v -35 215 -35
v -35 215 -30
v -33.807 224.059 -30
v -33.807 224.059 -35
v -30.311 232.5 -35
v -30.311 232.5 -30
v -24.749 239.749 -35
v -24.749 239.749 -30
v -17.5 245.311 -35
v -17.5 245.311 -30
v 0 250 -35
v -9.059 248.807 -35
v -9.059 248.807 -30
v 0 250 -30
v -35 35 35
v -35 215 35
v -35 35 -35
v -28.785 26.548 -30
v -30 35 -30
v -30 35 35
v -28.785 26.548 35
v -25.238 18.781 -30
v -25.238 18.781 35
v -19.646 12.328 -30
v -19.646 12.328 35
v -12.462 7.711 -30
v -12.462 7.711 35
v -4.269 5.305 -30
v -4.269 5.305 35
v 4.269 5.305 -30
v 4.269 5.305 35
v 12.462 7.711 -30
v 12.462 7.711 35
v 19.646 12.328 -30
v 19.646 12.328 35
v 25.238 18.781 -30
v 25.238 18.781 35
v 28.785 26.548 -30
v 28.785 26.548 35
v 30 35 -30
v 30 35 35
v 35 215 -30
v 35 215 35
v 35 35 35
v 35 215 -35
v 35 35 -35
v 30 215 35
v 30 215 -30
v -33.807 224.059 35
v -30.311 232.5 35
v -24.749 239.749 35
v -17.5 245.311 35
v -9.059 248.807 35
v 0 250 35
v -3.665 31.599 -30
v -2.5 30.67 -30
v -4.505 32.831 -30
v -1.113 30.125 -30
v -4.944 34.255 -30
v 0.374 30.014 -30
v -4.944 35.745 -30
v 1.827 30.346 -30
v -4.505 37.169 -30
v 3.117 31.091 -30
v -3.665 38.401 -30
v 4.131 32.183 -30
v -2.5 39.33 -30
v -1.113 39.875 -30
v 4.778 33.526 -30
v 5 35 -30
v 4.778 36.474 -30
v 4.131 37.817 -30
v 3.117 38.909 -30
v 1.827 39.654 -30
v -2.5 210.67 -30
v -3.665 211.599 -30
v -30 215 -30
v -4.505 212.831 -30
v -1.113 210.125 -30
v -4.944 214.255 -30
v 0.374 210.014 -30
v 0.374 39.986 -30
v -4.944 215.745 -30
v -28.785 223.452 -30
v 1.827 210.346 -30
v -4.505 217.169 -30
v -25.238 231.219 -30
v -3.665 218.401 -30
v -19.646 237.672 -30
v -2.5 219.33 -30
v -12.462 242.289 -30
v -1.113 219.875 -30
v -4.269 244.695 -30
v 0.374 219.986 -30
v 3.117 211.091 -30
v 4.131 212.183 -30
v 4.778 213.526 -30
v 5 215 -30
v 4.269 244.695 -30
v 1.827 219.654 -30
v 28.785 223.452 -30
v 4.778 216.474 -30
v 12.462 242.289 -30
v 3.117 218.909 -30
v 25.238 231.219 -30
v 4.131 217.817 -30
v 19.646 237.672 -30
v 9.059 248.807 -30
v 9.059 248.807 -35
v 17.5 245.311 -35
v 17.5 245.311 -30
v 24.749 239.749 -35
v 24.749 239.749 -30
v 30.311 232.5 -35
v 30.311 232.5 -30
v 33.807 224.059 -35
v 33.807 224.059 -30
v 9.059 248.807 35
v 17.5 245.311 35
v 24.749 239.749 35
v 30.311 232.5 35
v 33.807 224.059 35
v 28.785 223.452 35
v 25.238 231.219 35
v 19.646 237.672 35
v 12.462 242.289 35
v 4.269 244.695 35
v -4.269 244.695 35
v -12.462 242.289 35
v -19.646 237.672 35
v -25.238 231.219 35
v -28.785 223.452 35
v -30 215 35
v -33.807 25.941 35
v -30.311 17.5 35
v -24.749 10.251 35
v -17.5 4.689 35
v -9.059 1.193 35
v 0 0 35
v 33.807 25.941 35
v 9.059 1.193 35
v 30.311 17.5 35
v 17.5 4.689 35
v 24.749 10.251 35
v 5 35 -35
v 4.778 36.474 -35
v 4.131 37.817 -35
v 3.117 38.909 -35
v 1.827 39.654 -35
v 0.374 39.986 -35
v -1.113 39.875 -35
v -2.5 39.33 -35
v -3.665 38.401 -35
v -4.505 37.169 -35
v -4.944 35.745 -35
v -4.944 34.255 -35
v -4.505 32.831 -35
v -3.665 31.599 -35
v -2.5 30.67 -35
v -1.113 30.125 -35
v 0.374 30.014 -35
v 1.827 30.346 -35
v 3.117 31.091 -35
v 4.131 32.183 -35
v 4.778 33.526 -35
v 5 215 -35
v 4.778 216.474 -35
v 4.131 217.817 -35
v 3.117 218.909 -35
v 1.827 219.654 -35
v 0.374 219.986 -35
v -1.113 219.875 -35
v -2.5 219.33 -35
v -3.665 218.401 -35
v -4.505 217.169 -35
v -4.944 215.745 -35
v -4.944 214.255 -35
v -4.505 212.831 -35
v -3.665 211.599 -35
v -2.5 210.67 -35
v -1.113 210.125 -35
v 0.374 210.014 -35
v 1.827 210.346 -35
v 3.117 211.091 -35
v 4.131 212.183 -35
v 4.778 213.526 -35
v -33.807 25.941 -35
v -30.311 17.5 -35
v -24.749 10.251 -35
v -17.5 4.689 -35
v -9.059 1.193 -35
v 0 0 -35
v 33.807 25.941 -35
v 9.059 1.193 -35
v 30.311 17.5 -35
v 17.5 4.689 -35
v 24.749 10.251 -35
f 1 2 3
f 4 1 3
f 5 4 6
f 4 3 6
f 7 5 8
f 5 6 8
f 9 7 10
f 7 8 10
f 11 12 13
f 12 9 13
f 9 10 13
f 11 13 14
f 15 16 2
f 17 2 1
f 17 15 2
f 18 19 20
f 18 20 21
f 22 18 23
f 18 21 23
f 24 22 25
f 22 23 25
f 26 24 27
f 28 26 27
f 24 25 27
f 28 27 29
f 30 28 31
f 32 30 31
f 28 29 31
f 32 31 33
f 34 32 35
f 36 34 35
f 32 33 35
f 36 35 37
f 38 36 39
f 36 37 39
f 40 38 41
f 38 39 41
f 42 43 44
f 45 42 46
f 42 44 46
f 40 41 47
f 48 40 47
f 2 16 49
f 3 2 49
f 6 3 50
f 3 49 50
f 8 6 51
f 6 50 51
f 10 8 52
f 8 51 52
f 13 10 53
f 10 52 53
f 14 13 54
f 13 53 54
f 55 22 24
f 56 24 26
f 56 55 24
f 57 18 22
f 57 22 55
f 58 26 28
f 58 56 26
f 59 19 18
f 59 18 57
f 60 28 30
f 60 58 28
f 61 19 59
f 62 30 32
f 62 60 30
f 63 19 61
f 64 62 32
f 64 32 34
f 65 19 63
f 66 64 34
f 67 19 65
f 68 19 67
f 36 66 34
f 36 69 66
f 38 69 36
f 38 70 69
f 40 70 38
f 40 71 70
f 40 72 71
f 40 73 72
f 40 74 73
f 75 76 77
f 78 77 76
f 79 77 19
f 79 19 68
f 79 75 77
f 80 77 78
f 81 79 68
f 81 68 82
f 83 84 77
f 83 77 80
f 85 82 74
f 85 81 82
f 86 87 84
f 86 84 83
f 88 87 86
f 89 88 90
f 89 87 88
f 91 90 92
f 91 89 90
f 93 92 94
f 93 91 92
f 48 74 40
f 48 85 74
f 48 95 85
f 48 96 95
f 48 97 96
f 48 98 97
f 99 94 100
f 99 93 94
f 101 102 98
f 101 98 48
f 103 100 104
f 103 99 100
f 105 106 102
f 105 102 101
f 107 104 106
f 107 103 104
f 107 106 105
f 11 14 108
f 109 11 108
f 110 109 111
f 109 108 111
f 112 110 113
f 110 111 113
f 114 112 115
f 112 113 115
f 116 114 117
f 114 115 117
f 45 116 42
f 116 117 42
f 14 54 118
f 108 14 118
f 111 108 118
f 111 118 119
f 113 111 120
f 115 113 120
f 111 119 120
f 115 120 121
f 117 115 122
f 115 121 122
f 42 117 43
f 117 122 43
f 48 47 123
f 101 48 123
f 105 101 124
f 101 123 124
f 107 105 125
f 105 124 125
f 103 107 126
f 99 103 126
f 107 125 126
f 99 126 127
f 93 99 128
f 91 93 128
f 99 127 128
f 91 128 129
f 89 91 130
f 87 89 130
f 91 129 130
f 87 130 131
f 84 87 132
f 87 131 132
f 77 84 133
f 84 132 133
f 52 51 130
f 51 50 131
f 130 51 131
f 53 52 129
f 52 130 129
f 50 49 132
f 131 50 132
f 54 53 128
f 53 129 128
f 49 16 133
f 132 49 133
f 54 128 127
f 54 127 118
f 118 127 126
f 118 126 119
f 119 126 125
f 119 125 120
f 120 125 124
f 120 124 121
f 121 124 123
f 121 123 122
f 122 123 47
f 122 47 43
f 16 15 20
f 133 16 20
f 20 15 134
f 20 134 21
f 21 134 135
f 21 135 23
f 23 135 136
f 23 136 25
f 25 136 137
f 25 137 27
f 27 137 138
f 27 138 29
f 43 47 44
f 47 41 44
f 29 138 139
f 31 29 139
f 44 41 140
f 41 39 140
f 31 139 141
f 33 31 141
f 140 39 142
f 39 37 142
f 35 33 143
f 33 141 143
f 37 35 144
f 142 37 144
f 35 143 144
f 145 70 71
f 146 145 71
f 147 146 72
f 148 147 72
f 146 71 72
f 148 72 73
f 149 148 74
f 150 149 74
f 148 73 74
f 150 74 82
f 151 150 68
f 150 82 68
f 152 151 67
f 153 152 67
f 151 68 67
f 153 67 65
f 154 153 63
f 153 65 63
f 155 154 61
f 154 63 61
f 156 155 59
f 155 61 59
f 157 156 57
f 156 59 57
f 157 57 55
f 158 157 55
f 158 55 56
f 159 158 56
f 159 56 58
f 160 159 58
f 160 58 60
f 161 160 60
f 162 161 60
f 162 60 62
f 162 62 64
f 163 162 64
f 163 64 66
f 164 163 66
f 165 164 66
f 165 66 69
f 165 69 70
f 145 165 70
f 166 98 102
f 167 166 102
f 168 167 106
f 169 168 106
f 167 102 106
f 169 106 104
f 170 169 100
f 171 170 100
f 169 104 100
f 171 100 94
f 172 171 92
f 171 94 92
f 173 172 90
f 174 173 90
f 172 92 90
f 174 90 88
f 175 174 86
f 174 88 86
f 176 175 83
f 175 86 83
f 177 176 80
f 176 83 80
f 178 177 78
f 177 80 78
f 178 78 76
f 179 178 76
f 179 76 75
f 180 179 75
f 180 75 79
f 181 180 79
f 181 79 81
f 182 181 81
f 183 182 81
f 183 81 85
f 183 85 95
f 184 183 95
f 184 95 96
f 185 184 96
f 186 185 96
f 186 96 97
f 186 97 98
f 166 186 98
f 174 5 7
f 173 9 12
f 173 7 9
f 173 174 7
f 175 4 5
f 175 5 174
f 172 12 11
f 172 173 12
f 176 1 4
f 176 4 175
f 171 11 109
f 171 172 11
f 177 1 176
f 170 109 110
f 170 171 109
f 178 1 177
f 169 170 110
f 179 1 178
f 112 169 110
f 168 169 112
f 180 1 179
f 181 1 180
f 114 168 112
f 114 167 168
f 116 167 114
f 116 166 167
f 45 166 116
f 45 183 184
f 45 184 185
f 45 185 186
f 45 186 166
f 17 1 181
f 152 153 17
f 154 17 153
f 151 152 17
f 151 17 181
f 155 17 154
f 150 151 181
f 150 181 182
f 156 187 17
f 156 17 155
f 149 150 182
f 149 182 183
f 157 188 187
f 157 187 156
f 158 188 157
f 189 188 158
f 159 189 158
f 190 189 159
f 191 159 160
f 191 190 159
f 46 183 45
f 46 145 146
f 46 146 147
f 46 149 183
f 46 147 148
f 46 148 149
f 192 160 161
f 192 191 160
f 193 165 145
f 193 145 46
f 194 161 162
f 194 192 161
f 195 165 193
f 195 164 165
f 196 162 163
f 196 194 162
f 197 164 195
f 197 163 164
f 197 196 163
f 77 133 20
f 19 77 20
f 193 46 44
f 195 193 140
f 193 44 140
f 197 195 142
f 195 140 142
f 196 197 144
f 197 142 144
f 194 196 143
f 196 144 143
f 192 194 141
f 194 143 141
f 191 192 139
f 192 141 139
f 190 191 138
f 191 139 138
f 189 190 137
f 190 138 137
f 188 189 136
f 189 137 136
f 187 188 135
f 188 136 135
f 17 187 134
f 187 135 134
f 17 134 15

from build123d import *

# Parameters (mm, degrees)
SKETCH1_W           = 70
SKETCH1_H           = 70
BOSS_EXTRUDE1_DEPTH = 250
SKETCH2_R           = 30
CUT_EXTRUDE2_DEPTH  = 65
SKETCH4_R           = 5
CUT_EXTRUDE3_DEPTH  = 261.672207955


with BuildPart() as part:
    # Sketch1 → Boss-Extrude1 (new body)
    with BuildSketch(Plane(origin=(0, 0, 0), x_dir=(1, 0, 0), z_dir=(0, 1, 0))):
        Rectangle(SKETCH1_W, SKETCH1_H)
    extrude(amount=BOSS_EXTRUDE1_DEPTH)

    # Sketch2 → Cut-Extrude2 (cut)
    with BuildSketch(Plane.XY.offset(35)):
        with BuildLine():
            Line((-35, 250), (-35, 215))
            ThreePointArc((-35, 215), (-24.748737311, 239.748737372), (8.5e-08, 250))
            Line((8.5e-08, 250), (-35, 250))
        make_face()
        with BuildLine():
            Line((35, 250), (8.5e-08, 250))
            ThreePointArc((8.5e-08, 250), (24.748737372, 239.748737311), (35, 215))
            Line((35, 215), (35, 250))
        make_face()
        with BuildLine():
            ThreePointArc((1.6e-08, 0), (-24.748737336, 10.251262653), (-35, 35))
            Line((-35, 35), (-35, 0))
            Line((-35, 0), (1.6e-08, 0))
        make_face()
        with BuildLine():
            ThreePointArc((35, 35), (24.748737347, 10.251262664), (1.6e-08, 0))
            Line((1.6e-08, 0), (35, 0))
            Line((35, 0), (35, 35))
        make_face()
        with BuildLine():
            ThreePointArc((30, 215), (0, 185), (-30, 215))
            Line((-30, 215), (-30, 35))
            ThreePointArc((-30, 35), (0, 65), (30, 35))
            Line((30, 35), (30, 215))
        make_face()
        with Locations((0, 215)):
            Circle(SKETCH2_R)
        with Locations((0, 35)):
            Circle(SKETCH2_R)
    extrude(amount=-CUT_EXTRUDE2_DEPTH, mode=Mode.SUBTRACT)

    # Sketch4 → Cut-Extrude3 (cut, through all)
    with BuildSketch(Plane.XY.offset(-30)):
        with BuildLine():
            ThreePointArc((1.9e-08, 0), (-24.748737335, 10.251262652), (-35, 35))
            Line((-35, 35), (-35, 0))
            Line((-35, 0), (1.9e-08, 0))
        make_face()
        with BuildLine():
            Line((35, 0), (35, 35))
            ThreePointArc((35, 35), (24.748737348, 10.251262665), (1.9e-08, 0))
            Line((1.9e-08, 0), (35, 0))
        make_face()
        with BuildLine():
            Line((-35, 250), (-35, 215))
            ThreePointArc((-35, 215), (-24.748737474, 239.748737209), (-3.75e-07, 250))
            Line((-3.75e-07, 250), (-35, 250))
        make_face()
        with BuildLine():
            ThreePointArc((-3.75e-07, 250), (24.748737209, 239.748737474), (35, 215))
            Line((35, 215), (35, 250))
            Line((35, 250), (-3.75e-07, 250))
        make_face()
        with Locations((0, 215)):
            Circle(SKETCH4_R)
        with Locations((0, 35)):
            Circle(SKETCH4_R)
    extrude(amount=-CUT_EXTRUDE3_DEPTH, mode=Mode.SUBTRACT)


solid = part.part
